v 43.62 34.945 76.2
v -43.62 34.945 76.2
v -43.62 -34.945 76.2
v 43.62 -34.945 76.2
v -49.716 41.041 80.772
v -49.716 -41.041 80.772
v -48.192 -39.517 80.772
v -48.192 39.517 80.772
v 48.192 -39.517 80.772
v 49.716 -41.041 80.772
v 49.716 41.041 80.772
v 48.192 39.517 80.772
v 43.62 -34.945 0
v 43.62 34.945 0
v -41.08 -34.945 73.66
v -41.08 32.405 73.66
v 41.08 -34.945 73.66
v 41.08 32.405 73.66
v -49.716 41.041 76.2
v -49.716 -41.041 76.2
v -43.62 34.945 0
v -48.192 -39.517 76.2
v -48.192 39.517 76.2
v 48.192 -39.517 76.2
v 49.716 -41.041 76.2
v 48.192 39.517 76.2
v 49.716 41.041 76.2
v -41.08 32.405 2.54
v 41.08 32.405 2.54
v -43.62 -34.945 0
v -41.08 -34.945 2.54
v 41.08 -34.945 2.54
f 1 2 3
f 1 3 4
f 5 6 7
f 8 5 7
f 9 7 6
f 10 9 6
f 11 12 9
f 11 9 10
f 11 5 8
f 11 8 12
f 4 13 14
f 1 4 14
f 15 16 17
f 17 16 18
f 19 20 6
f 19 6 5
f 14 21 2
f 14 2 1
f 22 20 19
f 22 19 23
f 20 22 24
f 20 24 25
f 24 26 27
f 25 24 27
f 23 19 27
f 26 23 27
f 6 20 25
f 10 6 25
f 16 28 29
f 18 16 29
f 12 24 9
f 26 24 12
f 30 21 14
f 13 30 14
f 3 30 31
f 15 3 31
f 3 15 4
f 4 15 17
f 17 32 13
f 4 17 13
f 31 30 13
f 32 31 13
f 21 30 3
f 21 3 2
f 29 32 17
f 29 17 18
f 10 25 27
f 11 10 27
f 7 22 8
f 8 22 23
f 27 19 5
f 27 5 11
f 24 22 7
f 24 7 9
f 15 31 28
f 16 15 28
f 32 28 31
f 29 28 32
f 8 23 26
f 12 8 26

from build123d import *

# Parameters (mm, degrees)
F0_W     = 87.239668
F0_H     = 69.890052
F1_DEPTH = 76.2
F2_T     = -2.54
F3_W     = 99.431672
F3_H     = 82.082056
F3_W_2   = 96.383668
F3_H_2   = 79.034052
F4_DEPTH = 4.572


with BuildPart() as f1:
    # F0 (on Top) → F1 (new body)
    with BuildSketch(Plane.XY):
        Rectangle(F0_W, F0_H)
    extrude(amount=F1_DEPTH)

    # F2
    f2_openings = [f1.faces().sort_by_distance(p)[0] for p in [
        (0, -34.945026, 38.1),
    ]]
    offset(amount=F2_T, openings=f2_openings)


with BuildPart() as f4:
    # F3 (on face) → F4 (new body)
    with BuildSketch(Plane.XY.offset(76.2)):
        Rectangle(F3_W, F3_H)
        Rectangle(F3_W_2, F3_H_2, mode=Mode.SUBTRACT)
    extrude(amount=F4_DEPTH)


solid = Compound([f1.part, f4.part])
